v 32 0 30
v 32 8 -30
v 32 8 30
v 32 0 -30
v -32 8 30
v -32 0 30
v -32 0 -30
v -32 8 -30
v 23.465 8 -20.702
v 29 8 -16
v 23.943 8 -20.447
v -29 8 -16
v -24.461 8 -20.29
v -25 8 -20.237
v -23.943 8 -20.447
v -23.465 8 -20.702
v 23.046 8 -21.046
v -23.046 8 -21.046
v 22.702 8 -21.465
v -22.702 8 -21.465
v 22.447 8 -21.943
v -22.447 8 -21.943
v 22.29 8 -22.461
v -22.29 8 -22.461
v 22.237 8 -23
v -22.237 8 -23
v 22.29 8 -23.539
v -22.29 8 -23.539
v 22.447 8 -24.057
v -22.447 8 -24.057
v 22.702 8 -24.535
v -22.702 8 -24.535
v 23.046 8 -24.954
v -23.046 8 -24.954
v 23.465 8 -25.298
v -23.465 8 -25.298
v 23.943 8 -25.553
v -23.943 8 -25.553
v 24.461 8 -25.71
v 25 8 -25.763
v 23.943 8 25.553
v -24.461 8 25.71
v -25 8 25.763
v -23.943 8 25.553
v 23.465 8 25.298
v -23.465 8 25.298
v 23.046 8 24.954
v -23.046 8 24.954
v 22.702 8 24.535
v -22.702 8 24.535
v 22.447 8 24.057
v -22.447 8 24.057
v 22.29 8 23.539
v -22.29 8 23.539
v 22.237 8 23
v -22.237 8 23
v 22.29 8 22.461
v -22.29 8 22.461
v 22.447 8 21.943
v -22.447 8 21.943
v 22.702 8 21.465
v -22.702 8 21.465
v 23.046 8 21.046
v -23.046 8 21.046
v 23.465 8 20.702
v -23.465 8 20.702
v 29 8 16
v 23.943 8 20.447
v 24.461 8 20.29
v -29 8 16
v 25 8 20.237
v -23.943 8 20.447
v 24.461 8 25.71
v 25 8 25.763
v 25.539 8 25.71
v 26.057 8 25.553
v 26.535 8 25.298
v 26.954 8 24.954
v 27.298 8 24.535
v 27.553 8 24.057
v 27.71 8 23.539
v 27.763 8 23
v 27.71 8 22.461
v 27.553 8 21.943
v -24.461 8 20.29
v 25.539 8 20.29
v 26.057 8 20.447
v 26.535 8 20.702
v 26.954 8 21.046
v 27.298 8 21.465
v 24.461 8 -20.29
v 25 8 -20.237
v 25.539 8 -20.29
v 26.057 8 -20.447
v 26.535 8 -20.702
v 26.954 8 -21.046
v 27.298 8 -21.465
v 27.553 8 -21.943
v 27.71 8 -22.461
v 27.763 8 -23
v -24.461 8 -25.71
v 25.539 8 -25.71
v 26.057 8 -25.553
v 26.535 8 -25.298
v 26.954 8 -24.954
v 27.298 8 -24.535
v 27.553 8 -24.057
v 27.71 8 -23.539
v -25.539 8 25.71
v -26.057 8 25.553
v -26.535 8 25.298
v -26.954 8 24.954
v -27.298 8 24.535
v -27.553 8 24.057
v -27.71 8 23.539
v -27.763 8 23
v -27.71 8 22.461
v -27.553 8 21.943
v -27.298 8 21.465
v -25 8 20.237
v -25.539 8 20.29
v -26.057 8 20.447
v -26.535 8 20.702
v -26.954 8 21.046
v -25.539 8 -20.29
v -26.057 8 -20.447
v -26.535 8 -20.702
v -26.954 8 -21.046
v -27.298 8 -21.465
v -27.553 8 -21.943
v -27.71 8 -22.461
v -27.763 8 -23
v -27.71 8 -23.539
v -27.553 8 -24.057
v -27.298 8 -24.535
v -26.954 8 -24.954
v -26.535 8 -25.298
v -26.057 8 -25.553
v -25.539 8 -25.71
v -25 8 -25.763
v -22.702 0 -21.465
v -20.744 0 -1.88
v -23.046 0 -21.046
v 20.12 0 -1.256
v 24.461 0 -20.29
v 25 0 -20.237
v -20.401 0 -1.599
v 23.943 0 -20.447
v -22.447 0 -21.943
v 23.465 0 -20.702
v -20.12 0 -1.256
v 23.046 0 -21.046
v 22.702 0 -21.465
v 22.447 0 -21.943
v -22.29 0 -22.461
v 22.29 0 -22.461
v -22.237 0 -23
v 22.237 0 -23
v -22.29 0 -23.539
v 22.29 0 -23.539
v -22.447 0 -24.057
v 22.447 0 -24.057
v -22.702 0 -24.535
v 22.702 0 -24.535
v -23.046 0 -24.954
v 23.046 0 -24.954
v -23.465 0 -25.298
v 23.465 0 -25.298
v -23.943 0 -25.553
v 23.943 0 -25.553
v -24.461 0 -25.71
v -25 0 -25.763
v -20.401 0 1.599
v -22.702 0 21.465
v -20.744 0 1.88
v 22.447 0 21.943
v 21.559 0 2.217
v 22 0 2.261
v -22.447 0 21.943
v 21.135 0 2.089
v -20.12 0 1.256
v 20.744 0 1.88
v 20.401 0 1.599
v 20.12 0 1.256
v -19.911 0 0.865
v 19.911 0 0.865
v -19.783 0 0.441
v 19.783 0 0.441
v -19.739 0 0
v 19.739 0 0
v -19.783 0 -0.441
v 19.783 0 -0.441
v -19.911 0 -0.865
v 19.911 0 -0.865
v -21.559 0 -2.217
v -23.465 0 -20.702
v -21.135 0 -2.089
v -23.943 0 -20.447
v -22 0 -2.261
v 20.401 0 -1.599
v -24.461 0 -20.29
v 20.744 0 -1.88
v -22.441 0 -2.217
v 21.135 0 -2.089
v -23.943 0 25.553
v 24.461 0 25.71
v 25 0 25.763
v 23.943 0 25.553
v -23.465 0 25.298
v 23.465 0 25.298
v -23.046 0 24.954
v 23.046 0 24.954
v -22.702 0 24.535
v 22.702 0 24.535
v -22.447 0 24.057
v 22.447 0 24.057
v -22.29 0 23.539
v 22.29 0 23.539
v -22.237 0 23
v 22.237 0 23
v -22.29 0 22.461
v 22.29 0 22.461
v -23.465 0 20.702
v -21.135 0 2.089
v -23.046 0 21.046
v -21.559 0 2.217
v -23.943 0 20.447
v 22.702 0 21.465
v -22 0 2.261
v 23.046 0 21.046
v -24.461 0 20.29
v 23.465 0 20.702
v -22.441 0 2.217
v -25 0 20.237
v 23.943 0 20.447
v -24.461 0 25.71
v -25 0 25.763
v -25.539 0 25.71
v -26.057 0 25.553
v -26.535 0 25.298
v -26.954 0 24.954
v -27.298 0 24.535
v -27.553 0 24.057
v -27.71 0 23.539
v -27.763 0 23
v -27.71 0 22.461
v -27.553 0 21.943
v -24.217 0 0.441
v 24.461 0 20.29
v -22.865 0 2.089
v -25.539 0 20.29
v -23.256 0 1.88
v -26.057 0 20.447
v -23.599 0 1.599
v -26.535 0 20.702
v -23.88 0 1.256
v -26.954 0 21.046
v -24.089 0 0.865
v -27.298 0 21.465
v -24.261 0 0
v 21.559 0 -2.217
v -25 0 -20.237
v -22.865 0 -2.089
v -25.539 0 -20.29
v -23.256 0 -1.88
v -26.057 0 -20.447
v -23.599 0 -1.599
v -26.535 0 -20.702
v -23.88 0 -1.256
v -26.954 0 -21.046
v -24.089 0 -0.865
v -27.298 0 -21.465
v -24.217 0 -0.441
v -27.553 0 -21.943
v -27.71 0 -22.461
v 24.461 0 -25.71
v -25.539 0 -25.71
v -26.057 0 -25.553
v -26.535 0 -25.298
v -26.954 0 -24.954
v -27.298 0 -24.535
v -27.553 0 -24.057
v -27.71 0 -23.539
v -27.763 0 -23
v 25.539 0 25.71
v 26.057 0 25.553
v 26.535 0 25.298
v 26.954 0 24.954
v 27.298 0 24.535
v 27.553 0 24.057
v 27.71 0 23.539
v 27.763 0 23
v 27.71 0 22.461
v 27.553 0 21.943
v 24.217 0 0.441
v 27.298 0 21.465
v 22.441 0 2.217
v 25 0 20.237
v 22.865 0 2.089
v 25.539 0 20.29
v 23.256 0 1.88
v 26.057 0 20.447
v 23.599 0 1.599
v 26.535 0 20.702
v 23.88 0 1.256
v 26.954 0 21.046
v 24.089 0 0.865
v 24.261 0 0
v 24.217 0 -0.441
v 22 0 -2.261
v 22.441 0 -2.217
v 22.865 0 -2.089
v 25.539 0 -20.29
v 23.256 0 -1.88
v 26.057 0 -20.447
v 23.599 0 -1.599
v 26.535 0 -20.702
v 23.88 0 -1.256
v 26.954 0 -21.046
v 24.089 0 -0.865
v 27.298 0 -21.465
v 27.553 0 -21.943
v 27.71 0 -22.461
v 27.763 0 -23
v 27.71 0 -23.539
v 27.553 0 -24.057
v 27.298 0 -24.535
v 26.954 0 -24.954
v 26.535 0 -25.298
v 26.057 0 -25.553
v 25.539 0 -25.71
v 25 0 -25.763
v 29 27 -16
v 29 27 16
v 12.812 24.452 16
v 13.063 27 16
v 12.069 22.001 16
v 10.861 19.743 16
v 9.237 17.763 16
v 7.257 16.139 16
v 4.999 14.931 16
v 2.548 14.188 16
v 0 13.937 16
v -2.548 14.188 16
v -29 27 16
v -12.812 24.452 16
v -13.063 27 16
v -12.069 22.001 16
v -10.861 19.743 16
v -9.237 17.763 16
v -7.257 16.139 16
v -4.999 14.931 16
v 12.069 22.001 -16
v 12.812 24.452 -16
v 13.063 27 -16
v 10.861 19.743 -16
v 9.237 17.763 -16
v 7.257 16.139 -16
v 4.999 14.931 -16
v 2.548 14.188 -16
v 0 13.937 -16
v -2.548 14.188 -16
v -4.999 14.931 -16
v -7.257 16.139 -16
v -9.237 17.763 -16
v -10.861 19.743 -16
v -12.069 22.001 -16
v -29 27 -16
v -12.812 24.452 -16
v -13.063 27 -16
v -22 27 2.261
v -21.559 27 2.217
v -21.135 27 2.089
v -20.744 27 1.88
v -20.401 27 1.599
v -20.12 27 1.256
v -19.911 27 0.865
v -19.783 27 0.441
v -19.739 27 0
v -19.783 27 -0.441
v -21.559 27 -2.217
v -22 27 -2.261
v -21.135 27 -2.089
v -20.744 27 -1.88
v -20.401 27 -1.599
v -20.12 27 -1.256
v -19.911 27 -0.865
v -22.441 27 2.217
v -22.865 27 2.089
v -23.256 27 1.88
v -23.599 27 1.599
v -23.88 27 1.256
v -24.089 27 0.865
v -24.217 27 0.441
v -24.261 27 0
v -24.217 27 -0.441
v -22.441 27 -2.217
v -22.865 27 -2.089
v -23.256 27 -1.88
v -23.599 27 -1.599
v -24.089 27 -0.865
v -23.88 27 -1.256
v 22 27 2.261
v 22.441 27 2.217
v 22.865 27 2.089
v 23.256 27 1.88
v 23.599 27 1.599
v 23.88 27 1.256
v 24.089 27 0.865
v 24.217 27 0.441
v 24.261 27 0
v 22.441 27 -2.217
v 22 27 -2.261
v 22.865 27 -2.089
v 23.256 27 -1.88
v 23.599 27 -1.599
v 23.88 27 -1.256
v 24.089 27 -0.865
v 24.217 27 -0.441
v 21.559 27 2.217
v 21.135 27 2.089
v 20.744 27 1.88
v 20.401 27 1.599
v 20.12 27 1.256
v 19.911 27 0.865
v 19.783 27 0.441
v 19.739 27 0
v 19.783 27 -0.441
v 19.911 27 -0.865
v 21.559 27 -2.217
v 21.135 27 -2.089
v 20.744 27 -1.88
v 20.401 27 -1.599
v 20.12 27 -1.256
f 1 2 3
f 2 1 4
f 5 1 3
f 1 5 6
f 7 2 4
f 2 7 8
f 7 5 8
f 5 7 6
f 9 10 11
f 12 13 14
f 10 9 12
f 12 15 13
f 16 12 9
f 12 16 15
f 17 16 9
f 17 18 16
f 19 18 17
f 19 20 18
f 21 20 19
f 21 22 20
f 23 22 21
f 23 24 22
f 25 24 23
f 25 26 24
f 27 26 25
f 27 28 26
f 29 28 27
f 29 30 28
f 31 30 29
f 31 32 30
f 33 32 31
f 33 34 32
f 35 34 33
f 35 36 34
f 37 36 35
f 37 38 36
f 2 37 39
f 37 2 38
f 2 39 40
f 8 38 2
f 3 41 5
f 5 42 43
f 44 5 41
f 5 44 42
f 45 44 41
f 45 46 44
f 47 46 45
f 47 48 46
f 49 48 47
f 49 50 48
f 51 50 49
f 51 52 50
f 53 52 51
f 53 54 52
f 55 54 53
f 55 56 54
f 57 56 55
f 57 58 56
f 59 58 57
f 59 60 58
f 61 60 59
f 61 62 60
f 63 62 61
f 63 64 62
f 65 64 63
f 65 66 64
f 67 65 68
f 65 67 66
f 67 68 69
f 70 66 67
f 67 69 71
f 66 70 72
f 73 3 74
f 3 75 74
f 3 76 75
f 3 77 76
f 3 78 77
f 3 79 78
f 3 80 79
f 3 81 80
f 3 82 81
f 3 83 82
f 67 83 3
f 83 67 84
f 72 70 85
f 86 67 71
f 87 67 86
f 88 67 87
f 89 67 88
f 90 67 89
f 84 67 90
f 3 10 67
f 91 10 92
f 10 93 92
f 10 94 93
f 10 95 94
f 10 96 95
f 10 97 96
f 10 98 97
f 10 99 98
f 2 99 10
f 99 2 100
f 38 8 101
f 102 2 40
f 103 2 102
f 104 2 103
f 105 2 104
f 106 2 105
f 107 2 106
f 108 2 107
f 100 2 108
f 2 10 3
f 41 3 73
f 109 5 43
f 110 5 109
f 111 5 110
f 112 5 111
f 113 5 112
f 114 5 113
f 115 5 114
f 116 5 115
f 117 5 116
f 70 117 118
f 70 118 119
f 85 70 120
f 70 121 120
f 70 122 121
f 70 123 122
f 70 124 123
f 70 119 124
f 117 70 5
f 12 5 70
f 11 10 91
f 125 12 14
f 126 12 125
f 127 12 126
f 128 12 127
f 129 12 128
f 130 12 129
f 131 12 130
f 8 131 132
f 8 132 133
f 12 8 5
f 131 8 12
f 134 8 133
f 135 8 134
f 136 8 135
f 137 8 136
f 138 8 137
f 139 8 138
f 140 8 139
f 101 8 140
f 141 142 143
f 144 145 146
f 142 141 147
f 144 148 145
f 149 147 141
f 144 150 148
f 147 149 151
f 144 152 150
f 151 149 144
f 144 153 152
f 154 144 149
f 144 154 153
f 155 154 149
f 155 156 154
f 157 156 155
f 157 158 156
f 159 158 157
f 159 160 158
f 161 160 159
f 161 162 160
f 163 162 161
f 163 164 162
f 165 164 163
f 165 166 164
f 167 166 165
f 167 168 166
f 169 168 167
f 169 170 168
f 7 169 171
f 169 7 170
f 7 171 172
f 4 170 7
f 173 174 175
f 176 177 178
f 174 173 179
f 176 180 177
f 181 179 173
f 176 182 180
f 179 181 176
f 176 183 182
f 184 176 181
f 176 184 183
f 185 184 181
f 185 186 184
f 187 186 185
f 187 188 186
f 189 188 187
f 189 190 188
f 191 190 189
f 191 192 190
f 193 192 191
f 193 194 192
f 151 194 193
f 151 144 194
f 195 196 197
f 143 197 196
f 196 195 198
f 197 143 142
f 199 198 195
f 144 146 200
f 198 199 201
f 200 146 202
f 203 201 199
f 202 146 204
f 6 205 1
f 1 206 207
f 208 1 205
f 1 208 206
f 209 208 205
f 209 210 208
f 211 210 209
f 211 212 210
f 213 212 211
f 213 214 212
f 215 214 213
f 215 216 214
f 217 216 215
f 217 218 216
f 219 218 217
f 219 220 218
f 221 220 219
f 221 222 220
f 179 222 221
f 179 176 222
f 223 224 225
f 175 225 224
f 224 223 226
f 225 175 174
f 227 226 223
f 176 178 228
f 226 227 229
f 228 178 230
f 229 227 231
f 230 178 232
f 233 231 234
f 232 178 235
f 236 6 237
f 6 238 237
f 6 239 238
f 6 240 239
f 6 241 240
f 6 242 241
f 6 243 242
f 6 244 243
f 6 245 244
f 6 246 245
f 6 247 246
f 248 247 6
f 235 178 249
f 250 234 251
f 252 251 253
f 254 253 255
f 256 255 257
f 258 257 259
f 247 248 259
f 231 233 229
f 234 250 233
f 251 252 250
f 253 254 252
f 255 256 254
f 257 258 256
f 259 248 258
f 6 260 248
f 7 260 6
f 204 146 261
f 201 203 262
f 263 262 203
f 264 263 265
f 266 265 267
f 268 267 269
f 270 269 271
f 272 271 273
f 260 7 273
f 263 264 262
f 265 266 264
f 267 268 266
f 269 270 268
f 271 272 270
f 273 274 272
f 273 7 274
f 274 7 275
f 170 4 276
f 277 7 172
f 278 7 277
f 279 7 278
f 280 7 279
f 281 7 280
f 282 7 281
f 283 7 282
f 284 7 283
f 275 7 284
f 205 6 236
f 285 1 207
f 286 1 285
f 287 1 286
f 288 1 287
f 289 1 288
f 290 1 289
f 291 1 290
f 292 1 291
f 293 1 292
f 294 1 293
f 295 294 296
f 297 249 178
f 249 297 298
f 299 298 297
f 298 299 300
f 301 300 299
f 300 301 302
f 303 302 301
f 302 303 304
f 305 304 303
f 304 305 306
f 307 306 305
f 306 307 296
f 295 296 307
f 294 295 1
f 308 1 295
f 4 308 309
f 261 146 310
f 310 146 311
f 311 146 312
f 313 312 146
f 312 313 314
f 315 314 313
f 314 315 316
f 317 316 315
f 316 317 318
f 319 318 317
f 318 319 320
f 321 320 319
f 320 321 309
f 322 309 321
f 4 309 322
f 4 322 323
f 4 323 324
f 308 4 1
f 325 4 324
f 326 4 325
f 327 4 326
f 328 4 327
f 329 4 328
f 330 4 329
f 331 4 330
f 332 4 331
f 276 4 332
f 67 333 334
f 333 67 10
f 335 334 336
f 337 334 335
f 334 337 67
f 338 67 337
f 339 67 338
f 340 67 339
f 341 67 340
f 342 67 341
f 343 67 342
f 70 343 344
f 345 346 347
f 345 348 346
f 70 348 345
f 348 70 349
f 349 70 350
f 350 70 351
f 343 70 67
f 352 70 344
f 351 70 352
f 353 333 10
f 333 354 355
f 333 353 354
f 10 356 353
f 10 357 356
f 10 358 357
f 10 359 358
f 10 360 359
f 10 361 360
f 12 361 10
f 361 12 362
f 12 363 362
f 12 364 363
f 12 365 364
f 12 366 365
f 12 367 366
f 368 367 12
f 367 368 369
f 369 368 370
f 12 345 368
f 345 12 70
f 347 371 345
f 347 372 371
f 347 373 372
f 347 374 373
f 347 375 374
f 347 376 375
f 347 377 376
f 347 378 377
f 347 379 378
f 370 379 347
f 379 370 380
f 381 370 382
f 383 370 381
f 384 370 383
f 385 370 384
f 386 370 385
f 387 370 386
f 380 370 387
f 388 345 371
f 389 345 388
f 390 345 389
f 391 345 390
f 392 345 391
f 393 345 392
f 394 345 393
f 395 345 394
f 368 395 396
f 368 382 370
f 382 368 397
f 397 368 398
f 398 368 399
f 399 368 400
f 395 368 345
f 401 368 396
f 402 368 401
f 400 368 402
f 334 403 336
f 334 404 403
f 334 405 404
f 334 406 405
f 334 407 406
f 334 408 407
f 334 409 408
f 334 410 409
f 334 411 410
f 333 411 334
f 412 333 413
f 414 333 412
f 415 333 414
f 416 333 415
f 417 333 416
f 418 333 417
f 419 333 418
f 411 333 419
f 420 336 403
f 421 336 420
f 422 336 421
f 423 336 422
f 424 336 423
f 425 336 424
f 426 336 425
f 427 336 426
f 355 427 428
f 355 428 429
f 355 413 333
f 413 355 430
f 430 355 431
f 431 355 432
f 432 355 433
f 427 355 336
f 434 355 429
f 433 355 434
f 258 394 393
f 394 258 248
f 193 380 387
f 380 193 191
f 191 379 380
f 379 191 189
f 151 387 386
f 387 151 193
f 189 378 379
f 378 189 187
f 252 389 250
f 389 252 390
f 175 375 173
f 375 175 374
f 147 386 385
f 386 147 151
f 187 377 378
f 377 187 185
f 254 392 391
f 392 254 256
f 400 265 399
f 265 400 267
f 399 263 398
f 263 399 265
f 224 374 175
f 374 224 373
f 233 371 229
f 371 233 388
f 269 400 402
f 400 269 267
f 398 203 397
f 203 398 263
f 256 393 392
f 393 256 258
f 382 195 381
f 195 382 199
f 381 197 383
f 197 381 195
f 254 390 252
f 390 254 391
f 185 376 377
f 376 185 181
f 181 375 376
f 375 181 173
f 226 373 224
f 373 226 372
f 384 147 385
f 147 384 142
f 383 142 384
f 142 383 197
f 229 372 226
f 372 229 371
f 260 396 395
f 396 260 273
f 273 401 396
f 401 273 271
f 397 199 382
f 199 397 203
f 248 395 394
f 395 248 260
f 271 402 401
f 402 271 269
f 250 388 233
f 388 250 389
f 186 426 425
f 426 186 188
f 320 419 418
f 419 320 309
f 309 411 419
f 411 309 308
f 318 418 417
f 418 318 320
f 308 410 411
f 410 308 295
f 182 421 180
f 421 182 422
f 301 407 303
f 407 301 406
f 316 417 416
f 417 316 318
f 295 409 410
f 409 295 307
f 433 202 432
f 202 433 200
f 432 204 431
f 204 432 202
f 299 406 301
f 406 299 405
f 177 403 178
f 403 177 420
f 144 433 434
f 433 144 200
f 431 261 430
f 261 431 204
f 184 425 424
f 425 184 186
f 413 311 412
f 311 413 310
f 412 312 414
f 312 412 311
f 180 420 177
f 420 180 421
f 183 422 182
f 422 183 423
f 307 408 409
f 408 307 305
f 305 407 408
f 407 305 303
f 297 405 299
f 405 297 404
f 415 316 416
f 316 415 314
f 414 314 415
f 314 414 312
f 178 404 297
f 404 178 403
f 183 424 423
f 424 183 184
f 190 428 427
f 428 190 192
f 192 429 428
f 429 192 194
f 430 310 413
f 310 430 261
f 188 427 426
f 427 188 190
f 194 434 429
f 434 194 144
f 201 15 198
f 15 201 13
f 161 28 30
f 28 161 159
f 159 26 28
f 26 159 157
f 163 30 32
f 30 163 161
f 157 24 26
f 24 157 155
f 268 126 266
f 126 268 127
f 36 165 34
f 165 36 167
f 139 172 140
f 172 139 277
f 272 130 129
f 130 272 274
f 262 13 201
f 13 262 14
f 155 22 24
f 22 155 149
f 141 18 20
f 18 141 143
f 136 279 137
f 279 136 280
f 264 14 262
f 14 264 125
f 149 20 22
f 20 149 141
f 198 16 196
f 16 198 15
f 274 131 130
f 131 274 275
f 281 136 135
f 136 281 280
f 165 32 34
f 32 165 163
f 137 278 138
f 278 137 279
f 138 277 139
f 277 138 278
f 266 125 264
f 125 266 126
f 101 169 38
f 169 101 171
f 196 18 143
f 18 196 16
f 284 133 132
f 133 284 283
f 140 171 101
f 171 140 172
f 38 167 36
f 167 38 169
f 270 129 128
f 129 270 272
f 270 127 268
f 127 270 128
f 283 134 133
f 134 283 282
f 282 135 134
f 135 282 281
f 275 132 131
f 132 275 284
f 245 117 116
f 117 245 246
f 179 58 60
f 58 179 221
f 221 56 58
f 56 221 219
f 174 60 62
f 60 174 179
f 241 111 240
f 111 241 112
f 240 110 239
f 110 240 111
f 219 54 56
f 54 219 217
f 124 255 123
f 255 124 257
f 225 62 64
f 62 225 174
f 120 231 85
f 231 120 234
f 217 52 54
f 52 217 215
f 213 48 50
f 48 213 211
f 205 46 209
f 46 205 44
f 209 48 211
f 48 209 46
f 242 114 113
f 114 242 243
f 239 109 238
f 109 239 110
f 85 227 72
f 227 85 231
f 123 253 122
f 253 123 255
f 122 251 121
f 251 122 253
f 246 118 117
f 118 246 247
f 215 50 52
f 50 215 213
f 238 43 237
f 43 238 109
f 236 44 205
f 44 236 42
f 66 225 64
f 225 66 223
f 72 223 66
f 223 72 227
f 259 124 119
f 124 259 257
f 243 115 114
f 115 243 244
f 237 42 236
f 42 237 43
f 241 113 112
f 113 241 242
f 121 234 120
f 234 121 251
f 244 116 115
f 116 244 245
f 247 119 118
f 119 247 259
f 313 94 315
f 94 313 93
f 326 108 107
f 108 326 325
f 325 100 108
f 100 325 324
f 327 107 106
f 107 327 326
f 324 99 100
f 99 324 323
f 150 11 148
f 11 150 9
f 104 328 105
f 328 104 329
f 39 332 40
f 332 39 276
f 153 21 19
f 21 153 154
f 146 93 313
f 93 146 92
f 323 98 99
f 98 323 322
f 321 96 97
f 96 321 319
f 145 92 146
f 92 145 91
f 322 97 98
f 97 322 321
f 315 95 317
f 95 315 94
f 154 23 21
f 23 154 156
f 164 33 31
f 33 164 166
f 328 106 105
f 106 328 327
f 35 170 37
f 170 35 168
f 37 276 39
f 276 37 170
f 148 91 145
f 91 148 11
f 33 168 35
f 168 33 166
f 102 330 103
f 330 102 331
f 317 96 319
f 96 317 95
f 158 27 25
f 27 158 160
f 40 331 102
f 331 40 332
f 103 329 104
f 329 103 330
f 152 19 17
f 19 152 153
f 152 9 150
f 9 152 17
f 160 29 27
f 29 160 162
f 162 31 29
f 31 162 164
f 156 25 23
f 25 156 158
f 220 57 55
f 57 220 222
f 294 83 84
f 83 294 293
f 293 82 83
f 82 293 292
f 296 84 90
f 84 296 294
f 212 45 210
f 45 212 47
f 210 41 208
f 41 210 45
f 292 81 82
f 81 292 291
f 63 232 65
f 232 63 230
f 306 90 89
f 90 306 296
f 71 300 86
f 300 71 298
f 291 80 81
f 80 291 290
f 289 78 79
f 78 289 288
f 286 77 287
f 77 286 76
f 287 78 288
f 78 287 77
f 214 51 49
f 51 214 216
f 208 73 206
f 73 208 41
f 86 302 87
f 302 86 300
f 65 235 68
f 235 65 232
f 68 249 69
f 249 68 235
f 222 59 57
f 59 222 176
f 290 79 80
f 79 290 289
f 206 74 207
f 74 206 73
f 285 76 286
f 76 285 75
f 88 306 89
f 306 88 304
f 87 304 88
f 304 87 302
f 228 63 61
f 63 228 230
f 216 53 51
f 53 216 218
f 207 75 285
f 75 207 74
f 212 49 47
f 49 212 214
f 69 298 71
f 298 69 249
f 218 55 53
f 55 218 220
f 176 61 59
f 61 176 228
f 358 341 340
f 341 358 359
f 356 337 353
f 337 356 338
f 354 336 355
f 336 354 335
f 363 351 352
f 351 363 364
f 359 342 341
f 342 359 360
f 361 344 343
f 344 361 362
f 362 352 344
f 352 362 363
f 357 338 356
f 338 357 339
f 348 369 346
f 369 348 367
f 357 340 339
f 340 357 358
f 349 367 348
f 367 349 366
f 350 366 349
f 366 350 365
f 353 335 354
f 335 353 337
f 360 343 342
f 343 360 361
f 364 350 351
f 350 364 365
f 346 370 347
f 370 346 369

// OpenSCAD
// file: ../../../../../scad/lib/parent_bottom_sensors.scad
// Parent lower assembly. mm. Purchased TD04A dimensions are PROVISIONAL.
/* [Fin cartridge] */
disk_d=225;
disk_t=5;
fin_h=125;
fin_w=65;
fin_t=4;
socket_outer=46;
beam_size=32;
beam_clear=0.5;
/* [Sensor carrier] */
carrier_w=210;
carrier_h=141;
carrier_t=8;
carrier_back=-75;
camera_x=-45;
camera_z=-110;
td_x=65;
td_z=-100;
/* [TD04A clamp: measure before printing] */
td_d=26;
td_len=55;
clamp_gap=0.5;
grip_h=32;
$fn=64;
module hole(d,h){cylinder(d=d/cos(180/32),h=h,$fn=32);}
module yhole(d,h){rotate([-90,0,0])hole(d,h);}

module cartridge(){
 assert(disk_d+10<=236 && fin_h+disk_t<=250);
 difference(){
  union(){
   cylinder(d=disk_d,h=disk_t,$fn=128);
   translate([-socket_outer/2,-socket_outer/2,disk_t])cube([socket_outer,socket_outer,fin_h]);
   for(a=[0:90:270])rotate([0,0,a])translate([socket_outer/2-0.2,-fin_t/2,disk_t])cube([fin_w+0.2,fin_t,fin_h]);
   for(x=[-23,23])for(y=[-23,23])translate([x,y,disk_t])cylinder(d=12,h=12);
  }
  translate([-(beam_size+beam_clear)/2,-(beam_size+beam_clear)/2,disk_t])cube([beam_size+beam_clear,beam_size+beam_clear,fin_h+1]);
  // Access to ballast bolt heads: open corner channels, not captive inaccessible pockets.
  for(x=[-23,23])for(y=[-23,23]){
   translate([x,y,-1])hole(5.5,19);
   translate([x,y,17])hole(12,fin_h);
  }
  for(z=[29,122])translate([-socket_outer/2-1,10,z])rotate([0,90,0])hole(6.5,socket_outer+2);
  for(x=[-75,75])for(y=[-50,-25])translate([x,y,-1])hole(5.5,disk_t+2);
  // Central M8 ballast screw access, its head remains inside the beam's existing recess.
  translate([0,0,-1])hole(18,disk_t+2);
 }
}

// Native Z=0 meets underside of disk. Rear plate is also the camera/TD mounting face.
module carrier(){
 difference(){
  union(){
   translate([-carrier_w/2,carrier_back,-carrier_h])cube([carrier_w,carrier_t,carrier_h]);
   difference(){
    translate([-carrier_w/2,carrier_back,-carrier_t])cube([carrier_w,55,carrier_t]);
    translate([0,0,-carrier_t-1])cylinder(r=64,h=carrier_t+2);
   }
  }
  for(x=[-75,75])for(y=[-50,-25])translate([x,y,-carrier_t-1])hole(5.5,carrier_t+2);
  for(x=[-11,11])for(z=[-16,16])translate([camera_x+x,carrier_back-1,camera_z+z])yhole(5.5,carrier_t+2);
  for(x=[-25,25])for(z=[-23,23])translate([td_x+x,carrier_back-1,td_z+z])yhole(5.5,carrier_t+2);
  // Clamp through-bolts also pass through carrier, retaining the split clamp with real nuts.
  for(x=[-22,22])translate([td_x+x,carrier_back-1,td_z])yhole(4.5,carrier_t+2);
  // Cable lacing eyes; no cut connector required to route cable alongside the plate.
  for(z=[-25,-50])for(x=[-45,65])translate([x,carrier_back-1,z])yhole(8,carrier_t+2);
 }
}

// Local mounting face Y=0, cylinder axis Z, center Y=27. Grip height 32.
module td_clamp(cap=false){
 assert(td_d>0 && td_d<32 && td_len>=grip_h);
 difference(){
  if(!cap)union(){
   translate([-32,0,-30])cube([64,8,60]);
   translate([-29,8,-grip_h/2])cube([58,19,grip_h]);
  }else translate([-29,27+clamp_gap,-grip_h/2])cube([58,19,grip_h]);
  translate([0,27,-grip_h/2-1])hole(td_d,grip_h+2);
  for(x=[-22,22])translate([x,-1,0])yhole(4.5,50);
  if(!cap)for(x=[-25,25])for(z=[-23,23])translate([x,-1,z])yhole(5.5,10);
 }
}
// main file
// mm. Assembly coordinates and explicit bed orientation.
part="assembly"; // [assembly,print]
use <../../../../../scad/lib/parent_bottom_sensors.scad>
if(part=="print"){rotate([90,0,0])td_clamp(false);}else{td_clamp(false);}
